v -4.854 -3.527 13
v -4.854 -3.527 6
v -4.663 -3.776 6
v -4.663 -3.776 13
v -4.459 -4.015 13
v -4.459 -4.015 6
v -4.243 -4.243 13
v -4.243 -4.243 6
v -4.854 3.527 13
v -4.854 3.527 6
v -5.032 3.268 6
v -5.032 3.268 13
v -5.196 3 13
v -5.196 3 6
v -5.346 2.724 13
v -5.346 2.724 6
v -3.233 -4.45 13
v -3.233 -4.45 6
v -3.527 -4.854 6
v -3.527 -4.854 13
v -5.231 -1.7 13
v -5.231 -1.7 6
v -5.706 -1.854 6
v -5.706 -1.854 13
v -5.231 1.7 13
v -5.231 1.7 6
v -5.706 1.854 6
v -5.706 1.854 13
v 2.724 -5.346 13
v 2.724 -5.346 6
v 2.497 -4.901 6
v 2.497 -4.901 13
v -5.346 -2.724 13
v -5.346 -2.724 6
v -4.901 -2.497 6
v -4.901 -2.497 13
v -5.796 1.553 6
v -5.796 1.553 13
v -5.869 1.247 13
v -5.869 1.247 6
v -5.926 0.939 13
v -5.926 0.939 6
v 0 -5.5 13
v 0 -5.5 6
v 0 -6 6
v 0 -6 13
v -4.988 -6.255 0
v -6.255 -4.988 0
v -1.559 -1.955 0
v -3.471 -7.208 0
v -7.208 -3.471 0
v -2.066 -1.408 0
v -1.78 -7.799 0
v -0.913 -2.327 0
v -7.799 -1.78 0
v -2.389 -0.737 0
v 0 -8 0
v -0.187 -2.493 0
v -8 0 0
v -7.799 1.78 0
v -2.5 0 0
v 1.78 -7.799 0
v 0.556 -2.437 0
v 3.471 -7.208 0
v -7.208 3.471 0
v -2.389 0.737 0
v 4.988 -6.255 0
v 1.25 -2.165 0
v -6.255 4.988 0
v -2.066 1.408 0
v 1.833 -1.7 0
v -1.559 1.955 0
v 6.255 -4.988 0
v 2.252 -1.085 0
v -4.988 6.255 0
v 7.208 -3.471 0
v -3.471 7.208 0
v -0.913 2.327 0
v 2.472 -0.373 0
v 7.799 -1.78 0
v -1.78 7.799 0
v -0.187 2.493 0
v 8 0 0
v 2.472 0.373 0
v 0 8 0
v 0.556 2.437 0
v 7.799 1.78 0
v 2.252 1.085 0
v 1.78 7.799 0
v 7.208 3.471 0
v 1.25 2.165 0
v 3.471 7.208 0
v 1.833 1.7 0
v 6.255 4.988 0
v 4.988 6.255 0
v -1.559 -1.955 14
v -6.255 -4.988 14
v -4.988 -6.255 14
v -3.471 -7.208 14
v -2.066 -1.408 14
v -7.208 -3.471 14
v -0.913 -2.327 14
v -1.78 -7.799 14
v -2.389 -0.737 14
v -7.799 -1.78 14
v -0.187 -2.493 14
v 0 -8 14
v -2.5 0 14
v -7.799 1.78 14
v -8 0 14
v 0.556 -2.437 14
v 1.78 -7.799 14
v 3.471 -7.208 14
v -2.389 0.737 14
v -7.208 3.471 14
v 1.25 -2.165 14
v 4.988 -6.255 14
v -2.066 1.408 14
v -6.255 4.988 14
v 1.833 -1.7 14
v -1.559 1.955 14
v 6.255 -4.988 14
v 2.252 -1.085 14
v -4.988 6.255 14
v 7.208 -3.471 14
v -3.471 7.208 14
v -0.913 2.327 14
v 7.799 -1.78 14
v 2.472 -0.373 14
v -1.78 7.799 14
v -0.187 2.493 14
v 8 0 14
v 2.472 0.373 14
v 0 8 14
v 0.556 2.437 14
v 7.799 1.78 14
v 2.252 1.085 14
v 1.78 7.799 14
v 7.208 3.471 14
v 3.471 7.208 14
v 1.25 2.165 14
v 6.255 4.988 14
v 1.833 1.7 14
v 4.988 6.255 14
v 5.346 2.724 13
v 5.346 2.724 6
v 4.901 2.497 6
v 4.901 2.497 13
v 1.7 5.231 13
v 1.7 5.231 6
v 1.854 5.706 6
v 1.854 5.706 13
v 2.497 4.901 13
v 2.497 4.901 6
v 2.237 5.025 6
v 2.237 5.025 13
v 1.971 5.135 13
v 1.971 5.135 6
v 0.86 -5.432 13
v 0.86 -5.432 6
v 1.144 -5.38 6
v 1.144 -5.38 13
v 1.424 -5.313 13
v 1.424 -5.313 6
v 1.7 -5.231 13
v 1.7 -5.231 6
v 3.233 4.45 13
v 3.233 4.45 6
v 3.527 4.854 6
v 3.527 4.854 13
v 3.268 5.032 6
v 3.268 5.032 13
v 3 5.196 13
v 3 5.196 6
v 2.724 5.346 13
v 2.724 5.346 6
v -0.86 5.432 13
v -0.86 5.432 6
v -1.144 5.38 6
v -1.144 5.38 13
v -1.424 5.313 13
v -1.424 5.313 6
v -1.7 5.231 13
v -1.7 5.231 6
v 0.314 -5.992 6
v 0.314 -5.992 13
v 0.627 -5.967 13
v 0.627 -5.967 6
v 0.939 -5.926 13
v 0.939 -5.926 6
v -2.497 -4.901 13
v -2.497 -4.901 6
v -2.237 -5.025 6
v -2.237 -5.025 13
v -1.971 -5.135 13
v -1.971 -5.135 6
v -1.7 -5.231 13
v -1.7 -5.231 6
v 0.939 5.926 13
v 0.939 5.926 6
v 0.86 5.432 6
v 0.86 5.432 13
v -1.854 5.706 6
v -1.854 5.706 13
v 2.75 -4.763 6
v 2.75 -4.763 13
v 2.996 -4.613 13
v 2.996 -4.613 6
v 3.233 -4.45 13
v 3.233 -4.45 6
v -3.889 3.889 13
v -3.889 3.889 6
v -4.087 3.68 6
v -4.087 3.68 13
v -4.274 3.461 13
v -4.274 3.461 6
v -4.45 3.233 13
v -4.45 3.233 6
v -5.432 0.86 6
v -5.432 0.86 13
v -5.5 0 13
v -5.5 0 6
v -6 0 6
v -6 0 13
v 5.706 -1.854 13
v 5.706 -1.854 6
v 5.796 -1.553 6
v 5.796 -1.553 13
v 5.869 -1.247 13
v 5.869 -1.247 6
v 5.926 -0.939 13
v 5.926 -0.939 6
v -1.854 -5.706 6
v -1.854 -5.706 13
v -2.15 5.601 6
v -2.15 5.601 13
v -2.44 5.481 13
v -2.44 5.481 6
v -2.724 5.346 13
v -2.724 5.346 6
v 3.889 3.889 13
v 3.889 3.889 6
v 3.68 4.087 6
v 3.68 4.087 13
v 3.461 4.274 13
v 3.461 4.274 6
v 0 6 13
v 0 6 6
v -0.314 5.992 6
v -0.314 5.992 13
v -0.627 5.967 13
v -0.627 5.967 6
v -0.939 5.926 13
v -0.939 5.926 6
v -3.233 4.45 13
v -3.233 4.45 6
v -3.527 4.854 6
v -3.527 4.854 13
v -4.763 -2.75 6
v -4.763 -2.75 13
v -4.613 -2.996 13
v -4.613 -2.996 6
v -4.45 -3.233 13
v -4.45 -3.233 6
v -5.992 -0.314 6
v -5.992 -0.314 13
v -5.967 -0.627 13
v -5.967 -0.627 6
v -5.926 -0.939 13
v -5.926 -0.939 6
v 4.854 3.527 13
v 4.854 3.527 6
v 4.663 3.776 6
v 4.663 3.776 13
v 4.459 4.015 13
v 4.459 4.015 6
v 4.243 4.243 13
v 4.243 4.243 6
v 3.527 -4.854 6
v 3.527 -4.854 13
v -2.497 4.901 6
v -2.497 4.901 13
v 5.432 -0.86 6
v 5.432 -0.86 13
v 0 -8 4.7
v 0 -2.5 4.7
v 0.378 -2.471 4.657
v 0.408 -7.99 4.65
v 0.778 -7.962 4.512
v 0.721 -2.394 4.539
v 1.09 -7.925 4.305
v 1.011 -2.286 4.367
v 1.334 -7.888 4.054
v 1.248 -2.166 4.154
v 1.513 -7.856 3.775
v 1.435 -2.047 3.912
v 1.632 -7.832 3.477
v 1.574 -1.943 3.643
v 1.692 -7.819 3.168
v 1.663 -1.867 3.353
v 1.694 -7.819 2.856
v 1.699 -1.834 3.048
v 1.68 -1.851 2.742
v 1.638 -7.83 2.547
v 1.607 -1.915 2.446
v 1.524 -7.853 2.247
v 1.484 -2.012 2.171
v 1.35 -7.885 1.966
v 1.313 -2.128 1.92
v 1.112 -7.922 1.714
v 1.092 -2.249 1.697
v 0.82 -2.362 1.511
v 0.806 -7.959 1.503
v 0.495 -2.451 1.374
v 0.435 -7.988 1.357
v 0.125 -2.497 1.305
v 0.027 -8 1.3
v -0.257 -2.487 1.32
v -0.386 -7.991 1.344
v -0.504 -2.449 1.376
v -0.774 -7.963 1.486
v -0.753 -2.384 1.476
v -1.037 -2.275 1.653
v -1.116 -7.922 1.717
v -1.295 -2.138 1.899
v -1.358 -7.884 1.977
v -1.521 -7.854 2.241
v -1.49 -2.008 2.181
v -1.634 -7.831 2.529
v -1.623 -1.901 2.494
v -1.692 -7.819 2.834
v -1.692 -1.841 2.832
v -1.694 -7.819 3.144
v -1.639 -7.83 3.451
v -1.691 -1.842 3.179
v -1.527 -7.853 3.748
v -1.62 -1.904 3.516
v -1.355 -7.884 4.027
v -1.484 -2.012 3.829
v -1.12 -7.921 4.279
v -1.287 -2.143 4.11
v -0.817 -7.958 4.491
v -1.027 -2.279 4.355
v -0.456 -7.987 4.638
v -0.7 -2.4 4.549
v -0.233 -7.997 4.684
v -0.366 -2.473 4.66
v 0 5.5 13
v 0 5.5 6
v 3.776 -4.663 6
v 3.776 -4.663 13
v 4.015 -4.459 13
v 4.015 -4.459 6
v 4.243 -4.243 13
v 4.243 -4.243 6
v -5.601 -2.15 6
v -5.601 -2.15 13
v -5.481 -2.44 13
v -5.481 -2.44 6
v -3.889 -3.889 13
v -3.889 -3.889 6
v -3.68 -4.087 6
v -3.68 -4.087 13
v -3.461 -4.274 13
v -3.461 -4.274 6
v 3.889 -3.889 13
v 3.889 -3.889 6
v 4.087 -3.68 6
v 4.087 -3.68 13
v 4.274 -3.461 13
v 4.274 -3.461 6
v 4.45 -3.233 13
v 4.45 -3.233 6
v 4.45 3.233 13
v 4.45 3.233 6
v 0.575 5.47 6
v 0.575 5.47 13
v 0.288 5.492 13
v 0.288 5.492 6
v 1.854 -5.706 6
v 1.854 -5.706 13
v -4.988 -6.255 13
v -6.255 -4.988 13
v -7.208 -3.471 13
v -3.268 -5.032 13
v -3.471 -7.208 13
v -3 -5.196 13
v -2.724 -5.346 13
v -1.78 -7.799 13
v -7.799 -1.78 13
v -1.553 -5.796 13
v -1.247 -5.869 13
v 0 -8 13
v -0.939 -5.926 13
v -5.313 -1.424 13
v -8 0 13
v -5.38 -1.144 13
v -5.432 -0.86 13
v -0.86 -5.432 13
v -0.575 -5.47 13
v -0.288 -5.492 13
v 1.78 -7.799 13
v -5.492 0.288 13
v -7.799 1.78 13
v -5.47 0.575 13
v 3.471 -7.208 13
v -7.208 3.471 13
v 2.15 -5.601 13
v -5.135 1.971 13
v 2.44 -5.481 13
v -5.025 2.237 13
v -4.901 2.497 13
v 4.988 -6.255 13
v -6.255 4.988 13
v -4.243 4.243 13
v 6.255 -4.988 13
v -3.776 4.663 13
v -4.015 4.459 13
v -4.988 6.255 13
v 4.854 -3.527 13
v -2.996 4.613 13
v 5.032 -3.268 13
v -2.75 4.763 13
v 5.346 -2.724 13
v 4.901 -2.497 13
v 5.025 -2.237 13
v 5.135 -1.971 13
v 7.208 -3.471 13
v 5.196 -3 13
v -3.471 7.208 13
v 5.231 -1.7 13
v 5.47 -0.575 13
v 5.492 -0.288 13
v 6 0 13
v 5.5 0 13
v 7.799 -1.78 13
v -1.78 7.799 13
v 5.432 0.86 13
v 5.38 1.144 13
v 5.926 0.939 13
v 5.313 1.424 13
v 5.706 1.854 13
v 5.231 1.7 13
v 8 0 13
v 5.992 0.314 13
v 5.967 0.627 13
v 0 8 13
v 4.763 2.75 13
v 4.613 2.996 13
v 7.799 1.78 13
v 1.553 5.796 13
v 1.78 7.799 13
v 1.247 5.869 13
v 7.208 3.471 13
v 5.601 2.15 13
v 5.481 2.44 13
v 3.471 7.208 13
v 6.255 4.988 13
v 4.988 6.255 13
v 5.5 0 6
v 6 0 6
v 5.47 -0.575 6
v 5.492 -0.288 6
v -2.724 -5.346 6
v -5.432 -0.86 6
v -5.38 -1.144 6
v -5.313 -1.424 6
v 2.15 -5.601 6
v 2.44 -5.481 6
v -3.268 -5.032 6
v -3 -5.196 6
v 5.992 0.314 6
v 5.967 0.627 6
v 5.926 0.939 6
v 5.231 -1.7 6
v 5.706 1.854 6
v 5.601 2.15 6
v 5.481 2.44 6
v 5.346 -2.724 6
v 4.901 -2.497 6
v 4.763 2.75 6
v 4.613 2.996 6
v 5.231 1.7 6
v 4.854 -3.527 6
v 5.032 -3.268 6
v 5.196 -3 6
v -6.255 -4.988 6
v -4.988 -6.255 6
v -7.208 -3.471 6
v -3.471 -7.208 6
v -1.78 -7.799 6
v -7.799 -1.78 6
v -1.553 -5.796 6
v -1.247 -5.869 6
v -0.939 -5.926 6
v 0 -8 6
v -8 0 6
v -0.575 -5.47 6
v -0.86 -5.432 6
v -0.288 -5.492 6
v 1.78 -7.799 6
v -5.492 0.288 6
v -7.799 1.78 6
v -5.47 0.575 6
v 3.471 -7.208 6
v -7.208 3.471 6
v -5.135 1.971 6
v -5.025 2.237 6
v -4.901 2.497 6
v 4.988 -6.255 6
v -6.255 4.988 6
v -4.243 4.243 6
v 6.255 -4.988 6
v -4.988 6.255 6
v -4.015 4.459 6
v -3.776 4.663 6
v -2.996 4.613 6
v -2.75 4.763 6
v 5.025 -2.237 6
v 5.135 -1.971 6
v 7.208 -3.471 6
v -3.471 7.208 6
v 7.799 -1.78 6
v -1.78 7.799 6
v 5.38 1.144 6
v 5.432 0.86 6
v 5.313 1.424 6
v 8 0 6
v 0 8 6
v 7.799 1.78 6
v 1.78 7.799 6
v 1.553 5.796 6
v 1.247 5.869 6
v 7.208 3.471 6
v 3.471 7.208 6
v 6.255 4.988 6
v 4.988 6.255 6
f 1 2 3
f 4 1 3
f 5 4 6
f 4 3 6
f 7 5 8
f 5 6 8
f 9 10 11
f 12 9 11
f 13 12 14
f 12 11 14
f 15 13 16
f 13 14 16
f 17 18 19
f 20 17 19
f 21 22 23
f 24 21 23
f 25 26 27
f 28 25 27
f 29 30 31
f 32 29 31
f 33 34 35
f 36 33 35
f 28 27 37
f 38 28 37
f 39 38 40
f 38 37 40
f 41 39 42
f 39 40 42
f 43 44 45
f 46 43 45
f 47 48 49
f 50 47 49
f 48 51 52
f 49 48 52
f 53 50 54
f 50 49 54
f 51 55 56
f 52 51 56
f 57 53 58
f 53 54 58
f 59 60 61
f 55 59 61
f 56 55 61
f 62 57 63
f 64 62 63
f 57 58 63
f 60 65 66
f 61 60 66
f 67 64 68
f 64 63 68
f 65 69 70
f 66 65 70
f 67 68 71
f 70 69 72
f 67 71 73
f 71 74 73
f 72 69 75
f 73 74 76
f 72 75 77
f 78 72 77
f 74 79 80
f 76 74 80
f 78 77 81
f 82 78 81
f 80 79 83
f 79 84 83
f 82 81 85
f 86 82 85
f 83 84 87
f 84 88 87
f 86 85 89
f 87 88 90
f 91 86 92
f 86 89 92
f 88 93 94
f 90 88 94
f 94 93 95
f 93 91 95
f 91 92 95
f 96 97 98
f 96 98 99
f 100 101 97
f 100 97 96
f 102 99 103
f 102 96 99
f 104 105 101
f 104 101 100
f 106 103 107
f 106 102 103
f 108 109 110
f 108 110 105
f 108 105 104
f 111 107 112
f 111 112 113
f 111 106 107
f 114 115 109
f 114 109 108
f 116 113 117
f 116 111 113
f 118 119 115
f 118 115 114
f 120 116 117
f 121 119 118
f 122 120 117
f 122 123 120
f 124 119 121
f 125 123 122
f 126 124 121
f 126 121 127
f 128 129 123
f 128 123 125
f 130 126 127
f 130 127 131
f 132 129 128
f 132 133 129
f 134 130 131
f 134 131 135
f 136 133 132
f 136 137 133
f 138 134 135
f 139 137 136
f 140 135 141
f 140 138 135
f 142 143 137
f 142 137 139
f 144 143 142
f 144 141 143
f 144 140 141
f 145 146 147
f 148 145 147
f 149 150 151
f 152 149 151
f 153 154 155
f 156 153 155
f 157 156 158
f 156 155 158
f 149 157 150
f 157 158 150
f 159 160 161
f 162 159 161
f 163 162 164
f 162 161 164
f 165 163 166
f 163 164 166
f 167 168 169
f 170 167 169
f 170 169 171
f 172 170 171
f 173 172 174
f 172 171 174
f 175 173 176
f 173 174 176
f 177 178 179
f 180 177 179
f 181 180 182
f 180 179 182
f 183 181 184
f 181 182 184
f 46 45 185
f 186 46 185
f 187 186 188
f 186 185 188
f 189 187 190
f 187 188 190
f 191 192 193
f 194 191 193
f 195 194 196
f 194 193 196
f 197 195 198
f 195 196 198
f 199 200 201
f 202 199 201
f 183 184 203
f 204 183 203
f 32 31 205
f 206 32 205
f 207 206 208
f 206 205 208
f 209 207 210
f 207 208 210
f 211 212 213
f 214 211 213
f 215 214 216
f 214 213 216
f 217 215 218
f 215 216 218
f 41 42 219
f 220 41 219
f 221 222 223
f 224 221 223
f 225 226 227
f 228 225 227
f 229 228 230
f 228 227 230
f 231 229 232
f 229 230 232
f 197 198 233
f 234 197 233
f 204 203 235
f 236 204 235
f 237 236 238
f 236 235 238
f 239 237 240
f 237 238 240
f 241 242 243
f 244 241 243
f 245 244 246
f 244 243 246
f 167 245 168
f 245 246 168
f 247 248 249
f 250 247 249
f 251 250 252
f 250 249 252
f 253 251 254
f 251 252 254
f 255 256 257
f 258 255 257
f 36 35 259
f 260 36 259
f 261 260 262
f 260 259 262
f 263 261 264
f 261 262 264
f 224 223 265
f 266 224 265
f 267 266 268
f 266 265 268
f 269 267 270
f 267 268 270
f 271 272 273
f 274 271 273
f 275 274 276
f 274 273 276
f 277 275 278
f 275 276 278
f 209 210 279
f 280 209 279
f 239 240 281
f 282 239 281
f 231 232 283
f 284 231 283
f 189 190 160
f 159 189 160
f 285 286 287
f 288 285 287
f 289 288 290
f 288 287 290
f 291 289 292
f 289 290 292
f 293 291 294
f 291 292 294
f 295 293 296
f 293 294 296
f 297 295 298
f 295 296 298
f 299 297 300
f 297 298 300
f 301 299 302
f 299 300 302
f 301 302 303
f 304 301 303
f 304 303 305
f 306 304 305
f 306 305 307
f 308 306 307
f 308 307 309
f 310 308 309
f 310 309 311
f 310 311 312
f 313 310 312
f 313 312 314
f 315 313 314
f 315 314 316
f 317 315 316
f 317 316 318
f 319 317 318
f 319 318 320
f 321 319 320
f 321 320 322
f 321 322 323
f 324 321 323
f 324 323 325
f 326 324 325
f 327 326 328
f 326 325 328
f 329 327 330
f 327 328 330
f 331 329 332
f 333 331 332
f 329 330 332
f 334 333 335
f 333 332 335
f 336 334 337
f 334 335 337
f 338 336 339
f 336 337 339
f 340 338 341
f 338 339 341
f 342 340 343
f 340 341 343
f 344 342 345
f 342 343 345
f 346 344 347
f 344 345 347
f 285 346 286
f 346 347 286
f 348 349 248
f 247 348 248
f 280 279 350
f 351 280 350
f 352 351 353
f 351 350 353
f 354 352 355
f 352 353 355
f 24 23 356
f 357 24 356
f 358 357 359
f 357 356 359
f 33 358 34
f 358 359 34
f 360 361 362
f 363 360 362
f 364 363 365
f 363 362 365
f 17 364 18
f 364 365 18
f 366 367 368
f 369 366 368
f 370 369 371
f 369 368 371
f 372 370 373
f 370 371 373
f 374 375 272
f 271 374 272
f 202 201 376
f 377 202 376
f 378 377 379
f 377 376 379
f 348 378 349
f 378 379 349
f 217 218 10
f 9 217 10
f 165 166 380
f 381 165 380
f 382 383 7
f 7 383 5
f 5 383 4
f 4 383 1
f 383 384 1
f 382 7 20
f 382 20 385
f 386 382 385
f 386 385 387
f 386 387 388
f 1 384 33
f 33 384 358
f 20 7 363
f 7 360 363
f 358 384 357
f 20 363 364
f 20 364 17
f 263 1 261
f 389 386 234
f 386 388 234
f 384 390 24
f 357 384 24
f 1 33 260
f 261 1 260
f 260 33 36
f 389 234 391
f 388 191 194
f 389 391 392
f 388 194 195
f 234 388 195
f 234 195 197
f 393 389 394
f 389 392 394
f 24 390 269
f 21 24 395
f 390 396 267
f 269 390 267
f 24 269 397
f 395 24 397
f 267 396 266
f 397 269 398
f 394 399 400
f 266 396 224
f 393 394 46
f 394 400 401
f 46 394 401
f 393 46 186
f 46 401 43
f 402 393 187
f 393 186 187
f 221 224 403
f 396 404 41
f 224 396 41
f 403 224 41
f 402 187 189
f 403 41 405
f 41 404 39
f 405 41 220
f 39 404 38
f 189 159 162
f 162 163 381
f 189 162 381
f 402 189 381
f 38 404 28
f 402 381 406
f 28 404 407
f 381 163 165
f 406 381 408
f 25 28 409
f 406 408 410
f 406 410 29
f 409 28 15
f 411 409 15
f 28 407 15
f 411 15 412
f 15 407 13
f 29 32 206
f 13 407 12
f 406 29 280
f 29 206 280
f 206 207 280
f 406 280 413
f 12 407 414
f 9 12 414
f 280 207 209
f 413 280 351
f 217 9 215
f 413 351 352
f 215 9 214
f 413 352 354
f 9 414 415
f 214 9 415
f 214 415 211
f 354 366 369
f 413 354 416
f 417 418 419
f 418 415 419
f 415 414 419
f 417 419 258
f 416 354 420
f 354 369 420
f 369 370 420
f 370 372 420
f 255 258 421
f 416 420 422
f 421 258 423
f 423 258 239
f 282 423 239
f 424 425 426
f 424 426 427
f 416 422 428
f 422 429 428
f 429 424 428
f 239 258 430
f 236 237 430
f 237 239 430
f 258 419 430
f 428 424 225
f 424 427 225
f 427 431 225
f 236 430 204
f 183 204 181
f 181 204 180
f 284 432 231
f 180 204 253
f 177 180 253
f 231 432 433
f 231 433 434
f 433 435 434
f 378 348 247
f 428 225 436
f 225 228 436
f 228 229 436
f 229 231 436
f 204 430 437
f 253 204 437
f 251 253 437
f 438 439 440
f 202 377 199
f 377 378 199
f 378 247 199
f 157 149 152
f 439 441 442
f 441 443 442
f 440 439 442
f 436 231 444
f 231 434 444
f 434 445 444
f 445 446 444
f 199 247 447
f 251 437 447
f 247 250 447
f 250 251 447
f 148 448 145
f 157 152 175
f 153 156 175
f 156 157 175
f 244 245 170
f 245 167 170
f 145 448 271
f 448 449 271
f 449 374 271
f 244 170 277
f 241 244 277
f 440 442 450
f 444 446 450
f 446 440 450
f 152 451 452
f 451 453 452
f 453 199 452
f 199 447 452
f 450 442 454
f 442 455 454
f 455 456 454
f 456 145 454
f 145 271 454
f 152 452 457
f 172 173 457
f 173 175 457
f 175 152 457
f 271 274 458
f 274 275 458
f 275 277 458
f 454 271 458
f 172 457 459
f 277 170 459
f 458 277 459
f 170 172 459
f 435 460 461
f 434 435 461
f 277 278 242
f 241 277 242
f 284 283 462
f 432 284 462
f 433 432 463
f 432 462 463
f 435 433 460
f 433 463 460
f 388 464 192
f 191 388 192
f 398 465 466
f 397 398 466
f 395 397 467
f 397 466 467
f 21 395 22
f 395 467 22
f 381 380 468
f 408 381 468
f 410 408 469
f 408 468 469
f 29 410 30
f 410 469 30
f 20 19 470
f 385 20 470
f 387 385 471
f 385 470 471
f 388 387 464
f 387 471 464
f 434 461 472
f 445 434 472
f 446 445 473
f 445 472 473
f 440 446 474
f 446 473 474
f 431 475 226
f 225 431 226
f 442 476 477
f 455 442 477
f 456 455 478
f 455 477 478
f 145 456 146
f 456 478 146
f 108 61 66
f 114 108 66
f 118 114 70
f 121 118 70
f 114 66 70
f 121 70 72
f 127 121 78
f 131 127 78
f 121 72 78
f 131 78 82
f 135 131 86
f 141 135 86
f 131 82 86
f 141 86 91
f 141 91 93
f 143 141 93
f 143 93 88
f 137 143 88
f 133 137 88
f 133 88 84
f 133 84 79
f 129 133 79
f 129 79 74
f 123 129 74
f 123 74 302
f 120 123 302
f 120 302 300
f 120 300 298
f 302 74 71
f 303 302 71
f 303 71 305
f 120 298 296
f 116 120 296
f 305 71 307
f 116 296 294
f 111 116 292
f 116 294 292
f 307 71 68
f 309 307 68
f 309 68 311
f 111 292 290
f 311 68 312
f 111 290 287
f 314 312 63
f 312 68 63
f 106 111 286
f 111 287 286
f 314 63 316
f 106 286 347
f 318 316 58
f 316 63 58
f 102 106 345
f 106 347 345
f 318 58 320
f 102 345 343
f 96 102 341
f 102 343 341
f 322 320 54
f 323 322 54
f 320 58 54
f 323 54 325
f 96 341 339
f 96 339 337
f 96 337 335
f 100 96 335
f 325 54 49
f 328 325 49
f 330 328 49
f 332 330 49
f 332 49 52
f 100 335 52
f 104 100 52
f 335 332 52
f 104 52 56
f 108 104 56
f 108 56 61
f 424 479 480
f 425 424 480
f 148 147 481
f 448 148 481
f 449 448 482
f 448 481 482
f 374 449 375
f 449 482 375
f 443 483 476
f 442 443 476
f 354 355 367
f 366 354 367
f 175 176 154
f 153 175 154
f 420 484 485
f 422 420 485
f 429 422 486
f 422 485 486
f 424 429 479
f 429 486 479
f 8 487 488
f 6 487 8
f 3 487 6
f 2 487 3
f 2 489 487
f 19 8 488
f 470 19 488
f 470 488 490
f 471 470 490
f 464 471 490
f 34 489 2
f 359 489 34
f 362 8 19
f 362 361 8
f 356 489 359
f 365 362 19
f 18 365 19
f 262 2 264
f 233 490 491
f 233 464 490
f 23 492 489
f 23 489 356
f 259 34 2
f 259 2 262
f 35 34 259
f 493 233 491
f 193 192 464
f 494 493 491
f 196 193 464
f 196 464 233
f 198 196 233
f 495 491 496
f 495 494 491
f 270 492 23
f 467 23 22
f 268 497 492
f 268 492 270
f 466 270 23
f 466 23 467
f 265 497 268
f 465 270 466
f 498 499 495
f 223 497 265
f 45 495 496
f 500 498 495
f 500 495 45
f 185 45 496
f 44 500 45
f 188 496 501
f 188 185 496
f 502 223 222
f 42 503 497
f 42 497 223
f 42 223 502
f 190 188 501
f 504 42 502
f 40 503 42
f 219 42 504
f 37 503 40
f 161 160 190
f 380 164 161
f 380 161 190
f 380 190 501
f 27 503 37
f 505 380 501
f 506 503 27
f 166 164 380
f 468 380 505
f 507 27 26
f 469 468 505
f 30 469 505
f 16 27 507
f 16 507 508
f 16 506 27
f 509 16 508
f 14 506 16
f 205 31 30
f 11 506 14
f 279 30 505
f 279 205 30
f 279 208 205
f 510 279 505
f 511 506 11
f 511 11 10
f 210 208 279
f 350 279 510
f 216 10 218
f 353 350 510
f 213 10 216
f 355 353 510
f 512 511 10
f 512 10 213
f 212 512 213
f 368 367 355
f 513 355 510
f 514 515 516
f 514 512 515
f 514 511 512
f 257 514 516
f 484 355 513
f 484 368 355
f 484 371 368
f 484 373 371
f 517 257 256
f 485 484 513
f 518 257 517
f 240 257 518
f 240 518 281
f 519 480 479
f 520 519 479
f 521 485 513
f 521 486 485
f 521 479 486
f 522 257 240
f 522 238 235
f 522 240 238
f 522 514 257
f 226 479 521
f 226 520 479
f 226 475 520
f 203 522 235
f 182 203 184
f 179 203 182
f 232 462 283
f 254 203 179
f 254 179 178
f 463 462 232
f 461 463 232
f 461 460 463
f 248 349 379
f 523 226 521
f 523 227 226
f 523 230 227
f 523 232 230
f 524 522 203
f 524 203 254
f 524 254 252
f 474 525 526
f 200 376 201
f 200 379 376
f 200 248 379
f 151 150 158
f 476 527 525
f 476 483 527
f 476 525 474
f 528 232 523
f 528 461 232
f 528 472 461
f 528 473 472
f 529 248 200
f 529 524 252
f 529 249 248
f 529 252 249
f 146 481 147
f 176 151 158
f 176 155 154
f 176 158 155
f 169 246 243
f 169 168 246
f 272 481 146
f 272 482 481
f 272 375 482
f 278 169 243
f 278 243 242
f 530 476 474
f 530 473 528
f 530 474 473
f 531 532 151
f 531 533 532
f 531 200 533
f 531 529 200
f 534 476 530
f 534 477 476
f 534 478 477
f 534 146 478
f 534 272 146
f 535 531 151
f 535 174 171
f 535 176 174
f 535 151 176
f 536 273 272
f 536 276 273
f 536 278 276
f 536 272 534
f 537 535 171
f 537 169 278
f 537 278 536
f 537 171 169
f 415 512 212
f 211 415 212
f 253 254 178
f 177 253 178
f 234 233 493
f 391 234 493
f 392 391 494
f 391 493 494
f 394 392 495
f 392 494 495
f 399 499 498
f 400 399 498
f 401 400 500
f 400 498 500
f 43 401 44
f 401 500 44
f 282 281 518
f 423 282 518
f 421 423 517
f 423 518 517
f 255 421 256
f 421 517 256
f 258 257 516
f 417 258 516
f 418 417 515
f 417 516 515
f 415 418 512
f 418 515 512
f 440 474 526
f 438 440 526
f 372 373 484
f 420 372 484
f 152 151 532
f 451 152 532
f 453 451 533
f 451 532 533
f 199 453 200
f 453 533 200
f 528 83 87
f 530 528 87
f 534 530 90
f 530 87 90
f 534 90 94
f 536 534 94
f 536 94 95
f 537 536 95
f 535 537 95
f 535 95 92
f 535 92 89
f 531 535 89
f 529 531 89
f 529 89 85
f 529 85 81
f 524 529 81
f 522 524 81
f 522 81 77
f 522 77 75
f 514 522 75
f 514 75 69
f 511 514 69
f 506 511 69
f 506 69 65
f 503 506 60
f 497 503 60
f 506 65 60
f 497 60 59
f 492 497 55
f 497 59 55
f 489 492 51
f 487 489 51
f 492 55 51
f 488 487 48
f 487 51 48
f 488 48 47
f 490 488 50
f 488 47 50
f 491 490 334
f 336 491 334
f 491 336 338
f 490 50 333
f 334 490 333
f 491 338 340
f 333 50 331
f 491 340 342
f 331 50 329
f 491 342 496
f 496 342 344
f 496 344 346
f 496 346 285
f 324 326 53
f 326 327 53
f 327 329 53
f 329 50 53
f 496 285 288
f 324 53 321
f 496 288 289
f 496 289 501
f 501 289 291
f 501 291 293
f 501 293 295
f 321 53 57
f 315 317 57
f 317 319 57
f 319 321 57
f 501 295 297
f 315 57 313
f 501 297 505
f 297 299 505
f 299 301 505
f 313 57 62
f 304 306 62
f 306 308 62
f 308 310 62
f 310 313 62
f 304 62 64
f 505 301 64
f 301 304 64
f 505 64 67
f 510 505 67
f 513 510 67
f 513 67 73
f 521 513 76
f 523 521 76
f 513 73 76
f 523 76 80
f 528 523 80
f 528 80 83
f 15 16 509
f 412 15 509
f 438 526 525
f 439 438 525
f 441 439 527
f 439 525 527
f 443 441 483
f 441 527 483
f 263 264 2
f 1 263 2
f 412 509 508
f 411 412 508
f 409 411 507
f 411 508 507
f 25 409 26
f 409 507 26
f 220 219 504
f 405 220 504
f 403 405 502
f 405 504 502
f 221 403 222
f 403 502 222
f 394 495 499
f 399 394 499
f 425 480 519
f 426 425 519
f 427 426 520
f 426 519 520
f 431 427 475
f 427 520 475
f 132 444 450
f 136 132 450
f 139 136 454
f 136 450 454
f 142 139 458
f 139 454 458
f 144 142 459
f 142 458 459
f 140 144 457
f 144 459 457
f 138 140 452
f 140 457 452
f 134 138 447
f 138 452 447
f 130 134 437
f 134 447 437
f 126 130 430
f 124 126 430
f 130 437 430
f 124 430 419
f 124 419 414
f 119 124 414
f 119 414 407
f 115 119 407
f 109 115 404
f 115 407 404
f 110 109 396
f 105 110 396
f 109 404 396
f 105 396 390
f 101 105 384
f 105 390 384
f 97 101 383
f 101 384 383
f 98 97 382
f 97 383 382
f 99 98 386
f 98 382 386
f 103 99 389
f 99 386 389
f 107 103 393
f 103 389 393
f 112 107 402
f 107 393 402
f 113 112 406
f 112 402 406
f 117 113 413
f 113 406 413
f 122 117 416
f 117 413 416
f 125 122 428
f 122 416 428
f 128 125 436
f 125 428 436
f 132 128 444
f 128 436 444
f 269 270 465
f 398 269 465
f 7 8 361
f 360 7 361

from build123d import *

# Parameters (mm, degrees)
SKETCH1_R           = 8
BOSS_EXTRUDE1_DEPTH = 6
BOSS_EXTRUDE2_DEPTH = 7
SKETCH3_R           = 8
BOSS_EXTRUDE3_DEPTH = 1
SKETCH4_R           = 2.5
CUT_EXTRUDE1_DEPTH  = 19
SKETCH5_R           = 1.7
CUT_EXTRUDE2_DEPTH  = 19


with BuildPart() as part:
    # Sketch1 → Boss-Extrude1 (new body)
    with BuildSketch(Plane.XY):
        Circle(SKETCH1_R)
    extrude(amount=BOSS_EXTRUDE1_DEPTH)

    # Sketch2 → Boss-Extrude2 (add)
    with BuildSketch(Plane.XY.offset(6)):
        with BuildLine():
            Line((0, 5.5), (0, 6))
            ThreePointArc((0, 6), (-0.470754574, 5.981504002), (-0.93860679, 5.926130044))
            Line((-0.93860679, 5.926130044), (-0.860389558, 5.432285873))
            ThreePointArc((-0.860389558, 5.432285873), (-1.283949501, 5.348034562), (-1.699593469, 5.23081084))
            Line((-1.699593469, 5.23081084), (-1.854101966, 5.706339098))
            ThreePointArc((-1.854101966, 5.706339098), (-2.296100594, 5.543277195), (-2.723942998, 5.346039145))
            Line((-2.723942998, 5.346039145), (-2.496947749, 4.900535883))
            ThreePointArc((-2.496947749, 4.900535883), (-2.873742106, 4.689520904), (-3.232818888, 4.449593469))
            Line((-3.232818888, 4.449593469), (-3.526711514, 4.854101966))
            ThreePointArc((-3.526711514, 4.854101966), (-3.89668829, 4.562435794), (-4.242640687, 4.242640687))
            Line((-4.242640687, 4.242640687), (-3.889087297, 3.889087297))
            ThreePointArc((-3.889087297, 3.889087297), (-4.182232811, 3.571964266), (-4.449593469, 3.232818888))
            Line((-4.449593469, 3.232818888), (-4.854101966, 3.526711514))
            ThreePointArc((-4.854101966, 3.526711514), (-5.115840986, 3.134991388), (-5.346039145, 2.723942998))
            Line((-5.346039145, 2.723942998), (-4.900535883, 2.496947749))
            ThreePointArc((-4.900535883, 2.496947749), (-5.081337429, 2.104758878), (-5.23081084, 1.699593469))
            Line((-5.23081084, 1.699593469), (-5.706339098, 1.854101966))
            ThreePointArc((-5.706339098, 1.854101966), (-5.834219522, 1.400672183), (-5.926130044, 0.93860679))
            Line((-5.926130044, 0.93860679), (-5.432285873, 0.860389558))
            ThreePointArc((-5.432285873, 0.860389558), (-5.483045336, 0.431525027), (-5.5, 0))
            Line((-5.5, 0), (-6, 0))
            ThreePointArc((-6, 0), (-5.981504002, -0.470754574), (-5.926130044, -0.93860679))
            Line((-5.926130044, -0.93860679), (-5.432285873, -0.860389558))
            ThreePointArc((-5.432285873, -0.860389558), (-5.348034562, -1.283949501), (-5.23081084, -1.699593469))
            Line((-5.23081084, -1.699593469), (-5.706339098, -1.854101966))
            ThreePointArc((-5.706339098, -1.854101966), (-5.543277195, -2.296100594), (-5.346039145, -2.723942998))
            Line((-5.346039145, -2.723942998), (-4.900535883, -2.496947749))
            ThreePointArc((-4.900535883, -2.496947749), (-4.689520904, -2.873742106), (-4.449593469, -3.232818888))
            Line((-4.449593469, -3.232818888), (-4.854101966, -3.526711514))
            ThreePointArc((-4.854101966, -3.526711514), (-4.562435794, -3.89668829), (-4.242640687, -4.242640687))
            Line((-4.242640687, -4.242640687), (-3.889087297, -3.889087297))
            ThreePointArc((-3.889087297, -3.889087297), (-3.571964266, -4.182232811), (-3.232818888, -4.449593469))
            Line((-3.232818888, -4.449593469), (-3.526711514, -4.854101966))
            ThreePointArc((-3.526711514, -4.854101966), (-3.134991388, -5.115840986), (-2.723942998, -5.346039145))
            Line((-2.723942998, -5.346039145), (-2.496947749, -4.900535883))
            ThreePointArc((-2.496947749, -4.900535883), (-2.104758878, -5.081337429), (-1.699593469, -5.23081084))
            Line((-1.699593469, -5.23081084), (-1.854101966, -5.706339098))
            ThreePointArc((-1.854101966, -5.706339098), (-1.400672183, -5.834219522), (-0.93860679, -5.926130044))
            Line((-0.93860679, -5.926130044), (-0.860389558, -5.432285873))
            ThreePointArc((-0.860389558, -5.432285873), (-0.431525027, -5.483045336), (0, -5.5))
            Line((0, -5.5), (0, -6))
            ThreePointArc((0, -6), (0.470754574, -5.981504002), (0.93860679, -5.926130044))
            Line((0.93860679, -5.926130044), (0.860389558, -5.432285873))
            ThreePointArc((0.860389558, -5.432285873), (1.283949501, -5.348034562), (1.699593469, -5.23081084))
            Line((1.699593469, -5.23081084), (1.854101966, -5.706339098))
            ThreePointArc((1.854101966, -5.706339098), (2.296100594, -5.543277195), (2.723942998, -5.346039145))
            Line((2.723942998, -5.346039145), (2.496947749, -4.900535883))
            ThreePointArc((2.496947749, -4.900535883), (2.873742106, -4.689520904), (3.232818888, -4.449593469))
            Line((3.232818888, -4.449593469), (3.526711514, -4.854101966))
            ThreePointArc((3.526711514, -4.854101966), (3.89668829, -4.562435794), (4.242640687, -4.242640687))
            Line((4.242640687, -4.242640687), (3.889087297, -3.889087297))
            ThreePointArc((3.889087297, -3.889087297), (4.182232811, -3.571964266), (4.449593469, -3.232818888))
            Line((4.449593469, -3.232818888), (4.854101966, -3.526711514))
            ThreePointArc((4.854101966, -3.526711514), (5.115840986, -3.134991388), (5.346039145, -2.723942998))
            Line((5.346039145, -2.723942998), (4.900535883, -2.496947749))
            ThreePointArc((4.900535883, -2.496947749), (5.081337429, -2.104758878), (5.23081084, -1.699593469))
            Line((5.23081084, -1.699593469), (5.706339098, -1.854101966))
            ThreePointArc((5.706339098, -1.854101966), (5.834219522, -1.400672183), (5.926130044, -0.93860679))
            Line((5.926130044, -0.93860679), (5.432285873, -0.860389558))
            ThreePointArc((5.432285873, -0.860389558), (5.483045336, -0.431525027), (5.5, 0))
            Line((5.5, 0), (6, 0))
            ThreePointArc((6, 0), (5.981504002, 0.470754574), (5.926130044, 0.93860679))
            Line((5.926130044, 0.93860679), (5.432285873, 0.860389558))
            ThreePointArc((5.432285873, 0.860389558), (5.348034562, 1.283949501), (5.23081084, 1.699593469))
            Line((5.23081084, 1.699593469), (5.706339098, 1.854101966))
            ThreePointArc((5.706339098, 1.854101966), (5.543277195, 2.296100594), (5.346039145, 2.723942998))
            Line((5.346039145, 2.723942998), (4.900535883, 2.496947749))
            ThreePointArc((4.900535883, 2.496947749), (4.689520904, 2.873742106), (4.449593469, 3.232818888))
            Line((4.449593469, 3.232818888), (4.854101966, 3.526711514))
            ThreePointArc((4.854101966, 3.526711514), (4.562435794, 3.89668829), (4.242640687, 4.242640687))
            Line((4.242640687, 4.242640687), (3.889087297, 3.889087297))
            ThreePointArc((3.889087297, 3.889087297), (3.571964266, 4.182232811), (3.232818888, 4.449593469))
            Line((3.232818888, 4.449593469), (3.526711514, 4.854101966))
            ThreePointArc((3.526711514, 4.854101966), (3.134991388, 5.115840986), (2.723942998, 5.346039145))
            Line((2.723942998, 5.346039145), (2.496947749, 4.900535883))
            ThreePointArc((2.496947749, 4.900535883), (2.104758878, 5.081337429), (1.699593469, 5.23081084))
            Line((1.699593469, 5.23081084), (1.854101966, 5.706339098))
            ThreePointArc((1.854101966, 5.706339098), (1.400672183, 5.834219522), (0.93860679, 5.926130044))
            Line((0.93860679, 5.926130044), (0.860389558, 5.432285873))
            ThreePointArc((0.860389558, 5.432285873), (0.431525027, 5.483045336), (0, 5.5))
        make_face()
    extrude(amount=BOSS_EXTRUDE2_DEPTH)

    # Sketch3 → Boss-Extrude3 (add)
    with BuildSketch(Plane.XY.offset(13)):
        Circle(SKETCH3_R)
    extrude(amount=BOSS_EXTRUDE3_DEPTH)

    # Sketch4 → Cut-Extrude1 (cut, through all)
    with BuildSketch(Plane(origin=(0, 0, 0), x_dir=(-1, 0, 0), z_dir=(0, 0, -1))):
        Circle(SKETCH4_R)
    extrude(amount=-CUT_EXTRUDE1_DEPTH, mode=Mode.SUBTRACT)

    # Sketch5 → Cut-Extrude2 (cut, through all)
    with BuildSketch(Plane(origin=(0, 0, 0), x_dir=(1, 0, 0), z_dir=(0, 1, 0))):
        with Locations(Location((0, -3, 0), (0, 0, 270))):
            Circle(SKETCH5_R)
    extrude(amount=-CUT_EXTRUDE2_DEPTH, mode=Mode.SUBTRACT)


solid = part.part
